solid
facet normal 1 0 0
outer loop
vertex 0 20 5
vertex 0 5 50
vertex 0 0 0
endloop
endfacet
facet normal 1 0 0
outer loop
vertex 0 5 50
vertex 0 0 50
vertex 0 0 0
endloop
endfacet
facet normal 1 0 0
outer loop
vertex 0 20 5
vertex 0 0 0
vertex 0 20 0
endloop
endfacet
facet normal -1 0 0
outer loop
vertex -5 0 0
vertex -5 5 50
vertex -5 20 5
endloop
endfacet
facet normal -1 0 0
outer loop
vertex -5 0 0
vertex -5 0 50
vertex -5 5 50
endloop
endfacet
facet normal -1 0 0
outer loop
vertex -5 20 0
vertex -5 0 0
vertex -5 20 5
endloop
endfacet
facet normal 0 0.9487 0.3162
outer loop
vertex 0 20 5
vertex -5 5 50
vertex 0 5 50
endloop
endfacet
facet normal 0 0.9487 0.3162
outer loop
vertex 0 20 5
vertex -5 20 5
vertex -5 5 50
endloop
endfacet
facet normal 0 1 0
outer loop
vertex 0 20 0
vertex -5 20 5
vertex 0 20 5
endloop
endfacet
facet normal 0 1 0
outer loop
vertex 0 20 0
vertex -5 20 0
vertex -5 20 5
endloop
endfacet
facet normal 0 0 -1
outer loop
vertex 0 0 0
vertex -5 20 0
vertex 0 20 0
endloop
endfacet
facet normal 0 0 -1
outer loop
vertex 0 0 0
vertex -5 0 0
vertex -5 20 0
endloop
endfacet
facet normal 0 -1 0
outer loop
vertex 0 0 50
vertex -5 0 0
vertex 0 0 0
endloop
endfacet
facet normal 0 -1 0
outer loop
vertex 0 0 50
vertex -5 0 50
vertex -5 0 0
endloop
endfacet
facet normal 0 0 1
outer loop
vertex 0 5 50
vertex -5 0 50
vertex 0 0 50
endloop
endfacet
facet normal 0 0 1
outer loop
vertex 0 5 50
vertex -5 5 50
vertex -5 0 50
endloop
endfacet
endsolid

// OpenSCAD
gusset();

module gusset(w=20,h=50,t=5,f=5){
    path=[
    [0,0],
    [0,w],
    [f,w],
    [h,f],
    [h,0]
    ];
    rotate([0,-90,0])linear_extrude(t)polygon(path);
}
